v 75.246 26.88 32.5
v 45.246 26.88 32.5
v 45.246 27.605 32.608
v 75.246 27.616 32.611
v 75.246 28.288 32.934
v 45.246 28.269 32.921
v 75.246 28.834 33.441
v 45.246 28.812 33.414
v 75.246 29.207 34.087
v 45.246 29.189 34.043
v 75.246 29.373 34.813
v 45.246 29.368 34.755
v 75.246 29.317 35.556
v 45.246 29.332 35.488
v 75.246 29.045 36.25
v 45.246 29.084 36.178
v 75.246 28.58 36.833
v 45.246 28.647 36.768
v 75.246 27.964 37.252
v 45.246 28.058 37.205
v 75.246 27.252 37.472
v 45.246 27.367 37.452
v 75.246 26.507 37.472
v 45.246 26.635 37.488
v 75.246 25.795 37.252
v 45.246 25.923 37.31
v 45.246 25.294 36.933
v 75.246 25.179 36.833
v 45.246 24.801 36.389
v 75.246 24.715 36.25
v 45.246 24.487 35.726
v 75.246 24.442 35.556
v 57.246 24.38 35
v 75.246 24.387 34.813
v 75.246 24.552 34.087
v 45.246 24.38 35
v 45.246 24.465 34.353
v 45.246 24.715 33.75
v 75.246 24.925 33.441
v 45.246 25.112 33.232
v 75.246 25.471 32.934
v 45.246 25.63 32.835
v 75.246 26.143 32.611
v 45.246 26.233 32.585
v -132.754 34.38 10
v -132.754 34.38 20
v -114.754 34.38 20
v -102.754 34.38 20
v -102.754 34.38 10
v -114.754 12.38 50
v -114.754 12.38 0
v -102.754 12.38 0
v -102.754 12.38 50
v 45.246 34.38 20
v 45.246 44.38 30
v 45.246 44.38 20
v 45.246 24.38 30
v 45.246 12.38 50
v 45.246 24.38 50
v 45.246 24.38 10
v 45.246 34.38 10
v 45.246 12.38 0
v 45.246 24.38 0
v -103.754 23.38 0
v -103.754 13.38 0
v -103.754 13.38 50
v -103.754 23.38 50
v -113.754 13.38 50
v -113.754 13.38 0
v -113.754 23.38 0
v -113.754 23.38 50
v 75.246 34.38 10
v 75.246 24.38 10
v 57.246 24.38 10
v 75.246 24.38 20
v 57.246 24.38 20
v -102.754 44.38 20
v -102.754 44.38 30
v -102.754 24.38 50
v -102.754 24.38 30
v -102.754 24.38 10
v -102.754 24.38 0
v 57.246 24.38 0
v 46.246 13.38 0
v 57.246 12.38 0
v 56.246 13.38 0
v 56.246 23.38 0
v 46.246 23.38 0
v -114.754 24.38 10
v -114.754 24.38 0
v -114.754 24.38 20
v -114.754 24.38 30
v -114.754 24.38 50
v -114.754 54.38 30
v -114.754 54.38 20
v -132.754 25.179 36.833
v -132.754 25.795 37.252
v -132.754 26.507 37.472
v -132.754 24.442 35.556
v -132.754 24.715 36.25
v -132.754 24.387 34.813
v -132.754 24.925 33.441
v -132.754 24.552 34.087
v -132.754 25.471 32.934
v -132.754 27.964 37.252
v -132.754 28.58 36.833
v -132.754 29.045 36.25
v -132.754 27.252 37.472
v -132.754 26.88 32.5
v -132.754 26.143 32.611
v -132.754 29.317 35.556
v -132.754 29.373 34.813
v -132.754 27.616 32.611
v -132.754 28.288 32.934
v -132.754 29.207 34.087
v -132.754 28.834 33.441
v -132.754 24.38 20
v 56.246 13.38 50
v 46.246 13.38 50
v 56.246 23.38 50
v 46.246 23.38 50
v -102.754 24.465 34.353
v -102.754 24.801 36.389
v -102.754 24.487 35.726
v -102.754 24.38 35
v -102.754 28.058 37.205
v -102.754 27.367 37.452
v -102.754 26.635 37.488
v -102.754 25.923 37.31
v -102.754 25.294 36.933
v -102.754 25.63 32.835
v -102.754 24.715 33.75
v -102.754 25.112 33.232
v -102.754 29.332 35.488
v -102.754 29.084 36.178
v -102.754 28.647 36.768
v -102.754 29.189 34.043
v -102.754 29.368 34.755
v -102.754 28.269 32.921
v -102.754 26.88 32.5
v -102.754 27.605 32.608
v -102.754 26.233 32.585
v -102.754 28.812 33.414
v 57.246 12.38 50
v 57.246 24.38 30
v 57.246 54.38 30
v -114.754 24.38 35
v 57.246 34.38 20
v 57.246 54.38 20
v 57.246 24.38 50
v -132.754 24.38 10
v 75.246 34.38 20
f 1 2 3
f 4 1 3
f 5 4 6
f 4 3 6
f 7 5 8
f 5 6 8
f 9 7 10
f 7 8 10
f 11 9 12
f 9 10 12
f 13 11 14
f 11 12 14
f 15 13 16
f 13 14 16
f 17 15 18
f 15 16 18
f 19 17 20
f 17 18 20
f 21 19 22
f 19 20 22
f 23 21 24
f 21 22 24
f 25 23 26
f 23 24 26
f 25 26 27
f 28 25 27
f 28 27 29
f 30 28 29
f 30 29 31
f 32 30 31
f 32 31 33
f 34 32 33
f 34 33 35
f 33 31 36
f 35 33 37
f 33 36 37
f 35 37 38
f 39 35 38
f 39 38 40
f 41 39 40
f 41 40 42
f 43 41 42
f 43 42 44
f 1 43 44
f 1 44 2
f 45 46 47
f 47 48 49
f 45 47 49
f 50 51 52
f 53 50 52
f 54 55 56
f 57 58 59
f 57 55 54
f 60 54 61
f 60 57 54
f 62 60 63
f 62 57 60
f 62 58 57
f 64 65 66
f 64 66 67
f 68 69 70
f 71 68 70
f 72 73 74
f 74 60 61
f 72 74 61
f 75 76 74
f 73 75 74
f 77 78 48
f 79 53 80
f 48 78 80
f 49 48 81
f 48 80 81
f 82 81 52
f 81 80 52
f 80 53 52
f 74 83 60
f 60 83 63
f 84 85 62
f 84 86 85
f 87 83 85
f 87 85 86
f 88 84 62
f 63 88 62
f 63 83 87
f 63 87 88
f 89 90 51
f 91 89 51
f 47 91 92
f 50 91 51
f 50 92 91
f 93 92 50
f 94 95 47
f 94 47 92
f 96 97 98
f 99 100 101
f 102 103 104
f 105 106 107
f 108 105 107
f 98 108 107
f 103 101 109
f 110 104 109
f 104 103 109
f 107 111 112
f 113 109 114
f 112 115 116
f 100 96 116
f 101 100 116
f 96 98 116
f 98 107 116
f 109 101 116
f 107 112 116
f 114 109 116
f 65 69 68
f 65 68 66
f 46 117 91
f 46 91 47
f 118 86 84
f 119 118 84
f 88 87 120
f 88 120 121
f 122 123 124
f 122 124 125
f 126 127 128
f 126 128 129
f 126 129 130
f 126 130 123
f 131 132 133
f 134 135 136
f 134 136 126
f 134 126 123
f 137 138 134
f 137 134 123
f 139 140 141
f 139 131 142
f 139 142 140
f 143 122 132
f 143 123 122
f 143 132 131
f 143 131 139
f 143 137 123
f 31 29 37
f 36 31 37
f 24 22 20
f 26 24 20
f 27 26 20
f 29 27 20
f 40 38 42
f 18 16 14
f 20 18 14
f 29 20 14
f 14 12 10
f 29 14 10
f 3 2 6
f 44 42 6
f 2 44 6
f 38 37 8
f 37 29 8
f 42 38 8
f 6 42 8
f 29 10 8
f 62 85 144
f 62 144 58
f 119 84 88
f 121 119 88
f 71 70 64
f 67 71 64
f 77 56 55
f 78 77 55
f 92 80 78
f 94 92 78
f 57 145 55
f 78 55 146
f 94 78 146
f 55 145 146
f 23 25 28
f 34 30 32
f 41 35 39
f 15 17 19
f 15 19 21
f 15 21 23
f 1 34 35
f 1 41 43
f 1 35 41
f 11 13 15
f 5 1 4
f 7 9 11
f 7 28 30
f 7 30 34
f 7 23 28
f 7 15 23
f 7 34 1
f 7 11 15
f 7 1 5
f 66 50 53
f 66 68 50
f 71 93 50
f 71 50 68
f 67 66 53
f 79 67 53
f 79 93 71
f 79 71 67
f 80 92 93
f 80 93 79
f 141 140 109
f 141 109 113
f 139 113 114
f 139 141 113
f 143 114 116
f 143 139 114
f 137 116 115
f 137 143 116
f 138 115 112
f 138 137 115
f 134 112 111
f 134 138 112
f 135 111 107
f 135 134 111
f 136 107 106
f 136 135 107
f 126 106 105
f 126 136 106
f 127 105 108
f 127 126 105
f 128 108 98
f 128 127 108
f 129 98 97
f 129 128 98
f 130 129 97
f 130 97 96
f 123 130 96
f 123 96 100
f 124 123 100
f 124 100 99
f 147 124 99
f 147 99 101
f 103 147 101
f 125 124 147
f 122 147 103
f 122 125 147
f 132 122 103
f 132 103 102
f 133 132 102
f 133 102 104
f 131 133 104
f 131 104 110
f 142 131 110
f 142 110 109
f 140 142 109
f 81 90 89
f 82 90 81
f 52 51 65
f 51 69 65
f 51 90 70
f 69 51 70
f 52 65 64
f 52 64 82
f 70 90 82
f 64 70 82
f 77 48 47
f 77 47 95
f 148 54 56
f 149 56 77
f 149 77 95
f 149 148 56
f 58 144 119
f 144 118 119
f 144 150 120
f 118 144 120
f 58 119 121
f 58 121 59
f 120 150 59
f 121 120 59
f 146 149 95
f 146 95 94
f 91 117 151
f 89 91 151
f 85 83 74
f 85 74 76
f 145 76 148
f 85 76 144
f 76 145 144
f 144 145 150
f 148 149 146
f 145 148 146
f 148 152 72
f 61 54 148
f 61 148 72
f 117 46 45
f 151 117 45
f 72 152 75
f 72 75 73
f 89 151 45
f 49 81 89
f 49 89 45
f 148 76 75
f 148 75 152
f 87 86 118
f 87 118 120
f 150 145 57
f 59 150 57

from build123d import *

# Parameters (mm, degrees)
SKETCH1_W           = 12
SKETCH1_H           = 12
SKETCH1_W_2         = 10
SKETCH1_H_2         = 10
BOSS_EXTRUDE1_DEPTH = 50
SKETCH2_W           = 10
SKETCH2_H           = 10
SKETCH2_R           = 2.5
BOSS_EXTRUDE2_DEPTH = 30
SKETCH3_W           = 12
SKETCH3_H           = 10
BOSS_EXTRUDE3_DEPTH = 20
BOSS_EXTRUDE4_START = -172
SKETCH5_W           = 10
SKETCH5_H           = 10
BOSS_EXTRUDE4_DEPTH = 172


with BuildPart() as part:
    # Sketch1 → Boss-Extrude1 (new body)
    with BuildSketch(Plane.XY):
        with Locations((-108.754467624, 18.379588337)):
            Rectangle(SKETCH1_W, SKETCH1_H)
        with Locations((-108.754467624, 18.379588337)):
            Rectangle(SKETCH1_W_2, SKETCH1_H_2, mode=Mode.SUBTRACT)
    extrude(amount=BOSS_EXTRUDE1_DEPTH)

    # Sketch2 → Boss-Extrude2 (add)
    with BuildSketch(Plane(origin=(-102.754467624, 0, 0), x_dir=(0, 0, -1), z_dir=(1, 0, 0))):
        with Locations((-15, 29.379588337)):
            Rectangle(SKETCH2_W, SKETCH2_H)
        with Locations((-35, 26.879588337)):
            Circle(SKETCH2_R)
    extrude(amount=-BOSS_EXTRUDE2_DEPTH)


with BuildPart() as boss_extrude2_piece_1:
    # of the separate pieces the step leaves, piece 1, a body of its own (boss_extrude2_pieces)
    add(part.part.solids().sort_by_distance((-114.754467624, 24.379588337, 0))[0])

    # Sketch3 → Boss-Extrude3 (add)
    with BuildSketch(Plane(origin=(0, 24.379588337, 0), x_dir=(1, 0, 0), z_dir=(0, 1, 0))):
        with Locations((-108.754467624, -25)):
            Rectangle(SKETCH3_W, SKETCH3_H)
    extrude(amount=BOSS_EXTRUDE3_DEPTH)


with BuildPart() as boss_extrude2_piece_2:
    # of the separate pieces the step leaves, piece 2, a body of its own (boss_extrude2_pieces)
    add(part.part.solids().sort_by_distance((-102.754467624, 26.879588337, 32.5))[0])


with BuildPart() as body_3:
    # Mirror6: mirrored copy
    add(boss_extrude2_piece_1.part.mirror(Plane.ZY.offset(28.754467624)))


with BuildPart() as body_4:
    # Mirror6 2: mirrored copy
    add(boss_extrude2_piece_2.part.mirror(Plane.ZY.offset(28.754467624)))


with BuildPart() as boss_extrude2_piece_1_1:
    add(boss_extrude2_piece_1.part)

    add(body_3.part)  # Boss-Extrude4 merges body 3
    # Sketch5 → Boss-Extrude4 (add)
    with BuildSketch(Plane.ZY.offset(114.754467624).offset(BOSS_EXTRUDE4_START)):
        with Locations((25, 49.379588337)):
            Rectangle(SKETCH5_W, SKETCH5_H)
    extrude(amount=BOSS_EXTRUDE4_DEPTH)


solid = Compound([boss_extrude2_piece_2.part, body_4.part, boss_extrude2_piece_1_1.part])
